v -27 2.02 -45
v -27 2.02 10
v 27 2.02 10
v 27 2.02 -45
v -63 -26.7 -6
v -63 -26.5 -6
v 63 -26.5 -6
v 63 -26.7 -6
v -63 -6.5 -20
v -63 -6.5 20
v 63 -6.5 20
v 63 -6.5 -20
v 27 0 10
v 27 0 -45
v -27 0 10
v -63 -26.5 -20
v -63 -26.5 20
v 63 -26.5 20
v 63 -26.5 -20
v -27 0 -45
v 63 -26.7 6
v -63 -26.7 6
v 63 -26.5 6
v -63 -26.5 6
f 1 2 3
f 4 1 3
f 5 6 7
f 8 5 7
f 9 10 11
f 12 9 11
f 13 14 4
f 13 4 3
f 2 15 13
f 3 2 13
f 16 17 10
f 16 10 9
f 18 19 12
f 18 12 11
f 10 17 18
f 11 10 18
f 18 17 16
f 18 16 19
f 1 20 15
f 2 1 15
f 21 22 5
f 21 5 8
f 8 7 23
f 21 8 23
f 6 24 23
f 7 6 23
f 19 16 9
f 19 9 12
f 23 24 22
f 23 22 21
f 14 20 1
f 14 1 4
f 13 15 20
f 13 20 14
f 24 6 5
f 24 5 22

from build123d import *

# Parameters (mm, degrees)
F0_W     = 54
F0_H     = 55
F1_DEPTH = 2.02
F3_W     = 126
F3_H     = 14
F3_H_2   = 12
F4_DEPTH = 20
F5_DEPTH = 0.2


with BuildPart() as f1:
    # F0 (on Front) → F1 (new body)
    with BuildSketch(Plane.XZ):
        with Locations((0, -17.5)):
            Rectangle(F0_W, F0_H)
    extrude(amount=-F1_DEPTH)


with BuildPart() as f4:
    # F3 (on offset) → F4 (new body)
    with BuildSketch(Plane.XZ.offset(26.5)):
        with Locations((0, 13)):
            Rectangle(F3_W, F3_H)
        Rectangle(F3_W, F3_H_2)
        with Locations((0, -13)):
            Rectangle(F3_W, F3_H)
    extrude(amount=-F4_DEPTH)


with BuildPart() as f5:
    # F3 (on offset) → F5 (new body)
    with BuildSketch(Plane.XZ.offset(26.5)):
        Rectangle(F3_W, F3_H_2)
    extrude(amount=F5_DEPTH)


solid = Compound([f1.part, f4.part, f5.part])
